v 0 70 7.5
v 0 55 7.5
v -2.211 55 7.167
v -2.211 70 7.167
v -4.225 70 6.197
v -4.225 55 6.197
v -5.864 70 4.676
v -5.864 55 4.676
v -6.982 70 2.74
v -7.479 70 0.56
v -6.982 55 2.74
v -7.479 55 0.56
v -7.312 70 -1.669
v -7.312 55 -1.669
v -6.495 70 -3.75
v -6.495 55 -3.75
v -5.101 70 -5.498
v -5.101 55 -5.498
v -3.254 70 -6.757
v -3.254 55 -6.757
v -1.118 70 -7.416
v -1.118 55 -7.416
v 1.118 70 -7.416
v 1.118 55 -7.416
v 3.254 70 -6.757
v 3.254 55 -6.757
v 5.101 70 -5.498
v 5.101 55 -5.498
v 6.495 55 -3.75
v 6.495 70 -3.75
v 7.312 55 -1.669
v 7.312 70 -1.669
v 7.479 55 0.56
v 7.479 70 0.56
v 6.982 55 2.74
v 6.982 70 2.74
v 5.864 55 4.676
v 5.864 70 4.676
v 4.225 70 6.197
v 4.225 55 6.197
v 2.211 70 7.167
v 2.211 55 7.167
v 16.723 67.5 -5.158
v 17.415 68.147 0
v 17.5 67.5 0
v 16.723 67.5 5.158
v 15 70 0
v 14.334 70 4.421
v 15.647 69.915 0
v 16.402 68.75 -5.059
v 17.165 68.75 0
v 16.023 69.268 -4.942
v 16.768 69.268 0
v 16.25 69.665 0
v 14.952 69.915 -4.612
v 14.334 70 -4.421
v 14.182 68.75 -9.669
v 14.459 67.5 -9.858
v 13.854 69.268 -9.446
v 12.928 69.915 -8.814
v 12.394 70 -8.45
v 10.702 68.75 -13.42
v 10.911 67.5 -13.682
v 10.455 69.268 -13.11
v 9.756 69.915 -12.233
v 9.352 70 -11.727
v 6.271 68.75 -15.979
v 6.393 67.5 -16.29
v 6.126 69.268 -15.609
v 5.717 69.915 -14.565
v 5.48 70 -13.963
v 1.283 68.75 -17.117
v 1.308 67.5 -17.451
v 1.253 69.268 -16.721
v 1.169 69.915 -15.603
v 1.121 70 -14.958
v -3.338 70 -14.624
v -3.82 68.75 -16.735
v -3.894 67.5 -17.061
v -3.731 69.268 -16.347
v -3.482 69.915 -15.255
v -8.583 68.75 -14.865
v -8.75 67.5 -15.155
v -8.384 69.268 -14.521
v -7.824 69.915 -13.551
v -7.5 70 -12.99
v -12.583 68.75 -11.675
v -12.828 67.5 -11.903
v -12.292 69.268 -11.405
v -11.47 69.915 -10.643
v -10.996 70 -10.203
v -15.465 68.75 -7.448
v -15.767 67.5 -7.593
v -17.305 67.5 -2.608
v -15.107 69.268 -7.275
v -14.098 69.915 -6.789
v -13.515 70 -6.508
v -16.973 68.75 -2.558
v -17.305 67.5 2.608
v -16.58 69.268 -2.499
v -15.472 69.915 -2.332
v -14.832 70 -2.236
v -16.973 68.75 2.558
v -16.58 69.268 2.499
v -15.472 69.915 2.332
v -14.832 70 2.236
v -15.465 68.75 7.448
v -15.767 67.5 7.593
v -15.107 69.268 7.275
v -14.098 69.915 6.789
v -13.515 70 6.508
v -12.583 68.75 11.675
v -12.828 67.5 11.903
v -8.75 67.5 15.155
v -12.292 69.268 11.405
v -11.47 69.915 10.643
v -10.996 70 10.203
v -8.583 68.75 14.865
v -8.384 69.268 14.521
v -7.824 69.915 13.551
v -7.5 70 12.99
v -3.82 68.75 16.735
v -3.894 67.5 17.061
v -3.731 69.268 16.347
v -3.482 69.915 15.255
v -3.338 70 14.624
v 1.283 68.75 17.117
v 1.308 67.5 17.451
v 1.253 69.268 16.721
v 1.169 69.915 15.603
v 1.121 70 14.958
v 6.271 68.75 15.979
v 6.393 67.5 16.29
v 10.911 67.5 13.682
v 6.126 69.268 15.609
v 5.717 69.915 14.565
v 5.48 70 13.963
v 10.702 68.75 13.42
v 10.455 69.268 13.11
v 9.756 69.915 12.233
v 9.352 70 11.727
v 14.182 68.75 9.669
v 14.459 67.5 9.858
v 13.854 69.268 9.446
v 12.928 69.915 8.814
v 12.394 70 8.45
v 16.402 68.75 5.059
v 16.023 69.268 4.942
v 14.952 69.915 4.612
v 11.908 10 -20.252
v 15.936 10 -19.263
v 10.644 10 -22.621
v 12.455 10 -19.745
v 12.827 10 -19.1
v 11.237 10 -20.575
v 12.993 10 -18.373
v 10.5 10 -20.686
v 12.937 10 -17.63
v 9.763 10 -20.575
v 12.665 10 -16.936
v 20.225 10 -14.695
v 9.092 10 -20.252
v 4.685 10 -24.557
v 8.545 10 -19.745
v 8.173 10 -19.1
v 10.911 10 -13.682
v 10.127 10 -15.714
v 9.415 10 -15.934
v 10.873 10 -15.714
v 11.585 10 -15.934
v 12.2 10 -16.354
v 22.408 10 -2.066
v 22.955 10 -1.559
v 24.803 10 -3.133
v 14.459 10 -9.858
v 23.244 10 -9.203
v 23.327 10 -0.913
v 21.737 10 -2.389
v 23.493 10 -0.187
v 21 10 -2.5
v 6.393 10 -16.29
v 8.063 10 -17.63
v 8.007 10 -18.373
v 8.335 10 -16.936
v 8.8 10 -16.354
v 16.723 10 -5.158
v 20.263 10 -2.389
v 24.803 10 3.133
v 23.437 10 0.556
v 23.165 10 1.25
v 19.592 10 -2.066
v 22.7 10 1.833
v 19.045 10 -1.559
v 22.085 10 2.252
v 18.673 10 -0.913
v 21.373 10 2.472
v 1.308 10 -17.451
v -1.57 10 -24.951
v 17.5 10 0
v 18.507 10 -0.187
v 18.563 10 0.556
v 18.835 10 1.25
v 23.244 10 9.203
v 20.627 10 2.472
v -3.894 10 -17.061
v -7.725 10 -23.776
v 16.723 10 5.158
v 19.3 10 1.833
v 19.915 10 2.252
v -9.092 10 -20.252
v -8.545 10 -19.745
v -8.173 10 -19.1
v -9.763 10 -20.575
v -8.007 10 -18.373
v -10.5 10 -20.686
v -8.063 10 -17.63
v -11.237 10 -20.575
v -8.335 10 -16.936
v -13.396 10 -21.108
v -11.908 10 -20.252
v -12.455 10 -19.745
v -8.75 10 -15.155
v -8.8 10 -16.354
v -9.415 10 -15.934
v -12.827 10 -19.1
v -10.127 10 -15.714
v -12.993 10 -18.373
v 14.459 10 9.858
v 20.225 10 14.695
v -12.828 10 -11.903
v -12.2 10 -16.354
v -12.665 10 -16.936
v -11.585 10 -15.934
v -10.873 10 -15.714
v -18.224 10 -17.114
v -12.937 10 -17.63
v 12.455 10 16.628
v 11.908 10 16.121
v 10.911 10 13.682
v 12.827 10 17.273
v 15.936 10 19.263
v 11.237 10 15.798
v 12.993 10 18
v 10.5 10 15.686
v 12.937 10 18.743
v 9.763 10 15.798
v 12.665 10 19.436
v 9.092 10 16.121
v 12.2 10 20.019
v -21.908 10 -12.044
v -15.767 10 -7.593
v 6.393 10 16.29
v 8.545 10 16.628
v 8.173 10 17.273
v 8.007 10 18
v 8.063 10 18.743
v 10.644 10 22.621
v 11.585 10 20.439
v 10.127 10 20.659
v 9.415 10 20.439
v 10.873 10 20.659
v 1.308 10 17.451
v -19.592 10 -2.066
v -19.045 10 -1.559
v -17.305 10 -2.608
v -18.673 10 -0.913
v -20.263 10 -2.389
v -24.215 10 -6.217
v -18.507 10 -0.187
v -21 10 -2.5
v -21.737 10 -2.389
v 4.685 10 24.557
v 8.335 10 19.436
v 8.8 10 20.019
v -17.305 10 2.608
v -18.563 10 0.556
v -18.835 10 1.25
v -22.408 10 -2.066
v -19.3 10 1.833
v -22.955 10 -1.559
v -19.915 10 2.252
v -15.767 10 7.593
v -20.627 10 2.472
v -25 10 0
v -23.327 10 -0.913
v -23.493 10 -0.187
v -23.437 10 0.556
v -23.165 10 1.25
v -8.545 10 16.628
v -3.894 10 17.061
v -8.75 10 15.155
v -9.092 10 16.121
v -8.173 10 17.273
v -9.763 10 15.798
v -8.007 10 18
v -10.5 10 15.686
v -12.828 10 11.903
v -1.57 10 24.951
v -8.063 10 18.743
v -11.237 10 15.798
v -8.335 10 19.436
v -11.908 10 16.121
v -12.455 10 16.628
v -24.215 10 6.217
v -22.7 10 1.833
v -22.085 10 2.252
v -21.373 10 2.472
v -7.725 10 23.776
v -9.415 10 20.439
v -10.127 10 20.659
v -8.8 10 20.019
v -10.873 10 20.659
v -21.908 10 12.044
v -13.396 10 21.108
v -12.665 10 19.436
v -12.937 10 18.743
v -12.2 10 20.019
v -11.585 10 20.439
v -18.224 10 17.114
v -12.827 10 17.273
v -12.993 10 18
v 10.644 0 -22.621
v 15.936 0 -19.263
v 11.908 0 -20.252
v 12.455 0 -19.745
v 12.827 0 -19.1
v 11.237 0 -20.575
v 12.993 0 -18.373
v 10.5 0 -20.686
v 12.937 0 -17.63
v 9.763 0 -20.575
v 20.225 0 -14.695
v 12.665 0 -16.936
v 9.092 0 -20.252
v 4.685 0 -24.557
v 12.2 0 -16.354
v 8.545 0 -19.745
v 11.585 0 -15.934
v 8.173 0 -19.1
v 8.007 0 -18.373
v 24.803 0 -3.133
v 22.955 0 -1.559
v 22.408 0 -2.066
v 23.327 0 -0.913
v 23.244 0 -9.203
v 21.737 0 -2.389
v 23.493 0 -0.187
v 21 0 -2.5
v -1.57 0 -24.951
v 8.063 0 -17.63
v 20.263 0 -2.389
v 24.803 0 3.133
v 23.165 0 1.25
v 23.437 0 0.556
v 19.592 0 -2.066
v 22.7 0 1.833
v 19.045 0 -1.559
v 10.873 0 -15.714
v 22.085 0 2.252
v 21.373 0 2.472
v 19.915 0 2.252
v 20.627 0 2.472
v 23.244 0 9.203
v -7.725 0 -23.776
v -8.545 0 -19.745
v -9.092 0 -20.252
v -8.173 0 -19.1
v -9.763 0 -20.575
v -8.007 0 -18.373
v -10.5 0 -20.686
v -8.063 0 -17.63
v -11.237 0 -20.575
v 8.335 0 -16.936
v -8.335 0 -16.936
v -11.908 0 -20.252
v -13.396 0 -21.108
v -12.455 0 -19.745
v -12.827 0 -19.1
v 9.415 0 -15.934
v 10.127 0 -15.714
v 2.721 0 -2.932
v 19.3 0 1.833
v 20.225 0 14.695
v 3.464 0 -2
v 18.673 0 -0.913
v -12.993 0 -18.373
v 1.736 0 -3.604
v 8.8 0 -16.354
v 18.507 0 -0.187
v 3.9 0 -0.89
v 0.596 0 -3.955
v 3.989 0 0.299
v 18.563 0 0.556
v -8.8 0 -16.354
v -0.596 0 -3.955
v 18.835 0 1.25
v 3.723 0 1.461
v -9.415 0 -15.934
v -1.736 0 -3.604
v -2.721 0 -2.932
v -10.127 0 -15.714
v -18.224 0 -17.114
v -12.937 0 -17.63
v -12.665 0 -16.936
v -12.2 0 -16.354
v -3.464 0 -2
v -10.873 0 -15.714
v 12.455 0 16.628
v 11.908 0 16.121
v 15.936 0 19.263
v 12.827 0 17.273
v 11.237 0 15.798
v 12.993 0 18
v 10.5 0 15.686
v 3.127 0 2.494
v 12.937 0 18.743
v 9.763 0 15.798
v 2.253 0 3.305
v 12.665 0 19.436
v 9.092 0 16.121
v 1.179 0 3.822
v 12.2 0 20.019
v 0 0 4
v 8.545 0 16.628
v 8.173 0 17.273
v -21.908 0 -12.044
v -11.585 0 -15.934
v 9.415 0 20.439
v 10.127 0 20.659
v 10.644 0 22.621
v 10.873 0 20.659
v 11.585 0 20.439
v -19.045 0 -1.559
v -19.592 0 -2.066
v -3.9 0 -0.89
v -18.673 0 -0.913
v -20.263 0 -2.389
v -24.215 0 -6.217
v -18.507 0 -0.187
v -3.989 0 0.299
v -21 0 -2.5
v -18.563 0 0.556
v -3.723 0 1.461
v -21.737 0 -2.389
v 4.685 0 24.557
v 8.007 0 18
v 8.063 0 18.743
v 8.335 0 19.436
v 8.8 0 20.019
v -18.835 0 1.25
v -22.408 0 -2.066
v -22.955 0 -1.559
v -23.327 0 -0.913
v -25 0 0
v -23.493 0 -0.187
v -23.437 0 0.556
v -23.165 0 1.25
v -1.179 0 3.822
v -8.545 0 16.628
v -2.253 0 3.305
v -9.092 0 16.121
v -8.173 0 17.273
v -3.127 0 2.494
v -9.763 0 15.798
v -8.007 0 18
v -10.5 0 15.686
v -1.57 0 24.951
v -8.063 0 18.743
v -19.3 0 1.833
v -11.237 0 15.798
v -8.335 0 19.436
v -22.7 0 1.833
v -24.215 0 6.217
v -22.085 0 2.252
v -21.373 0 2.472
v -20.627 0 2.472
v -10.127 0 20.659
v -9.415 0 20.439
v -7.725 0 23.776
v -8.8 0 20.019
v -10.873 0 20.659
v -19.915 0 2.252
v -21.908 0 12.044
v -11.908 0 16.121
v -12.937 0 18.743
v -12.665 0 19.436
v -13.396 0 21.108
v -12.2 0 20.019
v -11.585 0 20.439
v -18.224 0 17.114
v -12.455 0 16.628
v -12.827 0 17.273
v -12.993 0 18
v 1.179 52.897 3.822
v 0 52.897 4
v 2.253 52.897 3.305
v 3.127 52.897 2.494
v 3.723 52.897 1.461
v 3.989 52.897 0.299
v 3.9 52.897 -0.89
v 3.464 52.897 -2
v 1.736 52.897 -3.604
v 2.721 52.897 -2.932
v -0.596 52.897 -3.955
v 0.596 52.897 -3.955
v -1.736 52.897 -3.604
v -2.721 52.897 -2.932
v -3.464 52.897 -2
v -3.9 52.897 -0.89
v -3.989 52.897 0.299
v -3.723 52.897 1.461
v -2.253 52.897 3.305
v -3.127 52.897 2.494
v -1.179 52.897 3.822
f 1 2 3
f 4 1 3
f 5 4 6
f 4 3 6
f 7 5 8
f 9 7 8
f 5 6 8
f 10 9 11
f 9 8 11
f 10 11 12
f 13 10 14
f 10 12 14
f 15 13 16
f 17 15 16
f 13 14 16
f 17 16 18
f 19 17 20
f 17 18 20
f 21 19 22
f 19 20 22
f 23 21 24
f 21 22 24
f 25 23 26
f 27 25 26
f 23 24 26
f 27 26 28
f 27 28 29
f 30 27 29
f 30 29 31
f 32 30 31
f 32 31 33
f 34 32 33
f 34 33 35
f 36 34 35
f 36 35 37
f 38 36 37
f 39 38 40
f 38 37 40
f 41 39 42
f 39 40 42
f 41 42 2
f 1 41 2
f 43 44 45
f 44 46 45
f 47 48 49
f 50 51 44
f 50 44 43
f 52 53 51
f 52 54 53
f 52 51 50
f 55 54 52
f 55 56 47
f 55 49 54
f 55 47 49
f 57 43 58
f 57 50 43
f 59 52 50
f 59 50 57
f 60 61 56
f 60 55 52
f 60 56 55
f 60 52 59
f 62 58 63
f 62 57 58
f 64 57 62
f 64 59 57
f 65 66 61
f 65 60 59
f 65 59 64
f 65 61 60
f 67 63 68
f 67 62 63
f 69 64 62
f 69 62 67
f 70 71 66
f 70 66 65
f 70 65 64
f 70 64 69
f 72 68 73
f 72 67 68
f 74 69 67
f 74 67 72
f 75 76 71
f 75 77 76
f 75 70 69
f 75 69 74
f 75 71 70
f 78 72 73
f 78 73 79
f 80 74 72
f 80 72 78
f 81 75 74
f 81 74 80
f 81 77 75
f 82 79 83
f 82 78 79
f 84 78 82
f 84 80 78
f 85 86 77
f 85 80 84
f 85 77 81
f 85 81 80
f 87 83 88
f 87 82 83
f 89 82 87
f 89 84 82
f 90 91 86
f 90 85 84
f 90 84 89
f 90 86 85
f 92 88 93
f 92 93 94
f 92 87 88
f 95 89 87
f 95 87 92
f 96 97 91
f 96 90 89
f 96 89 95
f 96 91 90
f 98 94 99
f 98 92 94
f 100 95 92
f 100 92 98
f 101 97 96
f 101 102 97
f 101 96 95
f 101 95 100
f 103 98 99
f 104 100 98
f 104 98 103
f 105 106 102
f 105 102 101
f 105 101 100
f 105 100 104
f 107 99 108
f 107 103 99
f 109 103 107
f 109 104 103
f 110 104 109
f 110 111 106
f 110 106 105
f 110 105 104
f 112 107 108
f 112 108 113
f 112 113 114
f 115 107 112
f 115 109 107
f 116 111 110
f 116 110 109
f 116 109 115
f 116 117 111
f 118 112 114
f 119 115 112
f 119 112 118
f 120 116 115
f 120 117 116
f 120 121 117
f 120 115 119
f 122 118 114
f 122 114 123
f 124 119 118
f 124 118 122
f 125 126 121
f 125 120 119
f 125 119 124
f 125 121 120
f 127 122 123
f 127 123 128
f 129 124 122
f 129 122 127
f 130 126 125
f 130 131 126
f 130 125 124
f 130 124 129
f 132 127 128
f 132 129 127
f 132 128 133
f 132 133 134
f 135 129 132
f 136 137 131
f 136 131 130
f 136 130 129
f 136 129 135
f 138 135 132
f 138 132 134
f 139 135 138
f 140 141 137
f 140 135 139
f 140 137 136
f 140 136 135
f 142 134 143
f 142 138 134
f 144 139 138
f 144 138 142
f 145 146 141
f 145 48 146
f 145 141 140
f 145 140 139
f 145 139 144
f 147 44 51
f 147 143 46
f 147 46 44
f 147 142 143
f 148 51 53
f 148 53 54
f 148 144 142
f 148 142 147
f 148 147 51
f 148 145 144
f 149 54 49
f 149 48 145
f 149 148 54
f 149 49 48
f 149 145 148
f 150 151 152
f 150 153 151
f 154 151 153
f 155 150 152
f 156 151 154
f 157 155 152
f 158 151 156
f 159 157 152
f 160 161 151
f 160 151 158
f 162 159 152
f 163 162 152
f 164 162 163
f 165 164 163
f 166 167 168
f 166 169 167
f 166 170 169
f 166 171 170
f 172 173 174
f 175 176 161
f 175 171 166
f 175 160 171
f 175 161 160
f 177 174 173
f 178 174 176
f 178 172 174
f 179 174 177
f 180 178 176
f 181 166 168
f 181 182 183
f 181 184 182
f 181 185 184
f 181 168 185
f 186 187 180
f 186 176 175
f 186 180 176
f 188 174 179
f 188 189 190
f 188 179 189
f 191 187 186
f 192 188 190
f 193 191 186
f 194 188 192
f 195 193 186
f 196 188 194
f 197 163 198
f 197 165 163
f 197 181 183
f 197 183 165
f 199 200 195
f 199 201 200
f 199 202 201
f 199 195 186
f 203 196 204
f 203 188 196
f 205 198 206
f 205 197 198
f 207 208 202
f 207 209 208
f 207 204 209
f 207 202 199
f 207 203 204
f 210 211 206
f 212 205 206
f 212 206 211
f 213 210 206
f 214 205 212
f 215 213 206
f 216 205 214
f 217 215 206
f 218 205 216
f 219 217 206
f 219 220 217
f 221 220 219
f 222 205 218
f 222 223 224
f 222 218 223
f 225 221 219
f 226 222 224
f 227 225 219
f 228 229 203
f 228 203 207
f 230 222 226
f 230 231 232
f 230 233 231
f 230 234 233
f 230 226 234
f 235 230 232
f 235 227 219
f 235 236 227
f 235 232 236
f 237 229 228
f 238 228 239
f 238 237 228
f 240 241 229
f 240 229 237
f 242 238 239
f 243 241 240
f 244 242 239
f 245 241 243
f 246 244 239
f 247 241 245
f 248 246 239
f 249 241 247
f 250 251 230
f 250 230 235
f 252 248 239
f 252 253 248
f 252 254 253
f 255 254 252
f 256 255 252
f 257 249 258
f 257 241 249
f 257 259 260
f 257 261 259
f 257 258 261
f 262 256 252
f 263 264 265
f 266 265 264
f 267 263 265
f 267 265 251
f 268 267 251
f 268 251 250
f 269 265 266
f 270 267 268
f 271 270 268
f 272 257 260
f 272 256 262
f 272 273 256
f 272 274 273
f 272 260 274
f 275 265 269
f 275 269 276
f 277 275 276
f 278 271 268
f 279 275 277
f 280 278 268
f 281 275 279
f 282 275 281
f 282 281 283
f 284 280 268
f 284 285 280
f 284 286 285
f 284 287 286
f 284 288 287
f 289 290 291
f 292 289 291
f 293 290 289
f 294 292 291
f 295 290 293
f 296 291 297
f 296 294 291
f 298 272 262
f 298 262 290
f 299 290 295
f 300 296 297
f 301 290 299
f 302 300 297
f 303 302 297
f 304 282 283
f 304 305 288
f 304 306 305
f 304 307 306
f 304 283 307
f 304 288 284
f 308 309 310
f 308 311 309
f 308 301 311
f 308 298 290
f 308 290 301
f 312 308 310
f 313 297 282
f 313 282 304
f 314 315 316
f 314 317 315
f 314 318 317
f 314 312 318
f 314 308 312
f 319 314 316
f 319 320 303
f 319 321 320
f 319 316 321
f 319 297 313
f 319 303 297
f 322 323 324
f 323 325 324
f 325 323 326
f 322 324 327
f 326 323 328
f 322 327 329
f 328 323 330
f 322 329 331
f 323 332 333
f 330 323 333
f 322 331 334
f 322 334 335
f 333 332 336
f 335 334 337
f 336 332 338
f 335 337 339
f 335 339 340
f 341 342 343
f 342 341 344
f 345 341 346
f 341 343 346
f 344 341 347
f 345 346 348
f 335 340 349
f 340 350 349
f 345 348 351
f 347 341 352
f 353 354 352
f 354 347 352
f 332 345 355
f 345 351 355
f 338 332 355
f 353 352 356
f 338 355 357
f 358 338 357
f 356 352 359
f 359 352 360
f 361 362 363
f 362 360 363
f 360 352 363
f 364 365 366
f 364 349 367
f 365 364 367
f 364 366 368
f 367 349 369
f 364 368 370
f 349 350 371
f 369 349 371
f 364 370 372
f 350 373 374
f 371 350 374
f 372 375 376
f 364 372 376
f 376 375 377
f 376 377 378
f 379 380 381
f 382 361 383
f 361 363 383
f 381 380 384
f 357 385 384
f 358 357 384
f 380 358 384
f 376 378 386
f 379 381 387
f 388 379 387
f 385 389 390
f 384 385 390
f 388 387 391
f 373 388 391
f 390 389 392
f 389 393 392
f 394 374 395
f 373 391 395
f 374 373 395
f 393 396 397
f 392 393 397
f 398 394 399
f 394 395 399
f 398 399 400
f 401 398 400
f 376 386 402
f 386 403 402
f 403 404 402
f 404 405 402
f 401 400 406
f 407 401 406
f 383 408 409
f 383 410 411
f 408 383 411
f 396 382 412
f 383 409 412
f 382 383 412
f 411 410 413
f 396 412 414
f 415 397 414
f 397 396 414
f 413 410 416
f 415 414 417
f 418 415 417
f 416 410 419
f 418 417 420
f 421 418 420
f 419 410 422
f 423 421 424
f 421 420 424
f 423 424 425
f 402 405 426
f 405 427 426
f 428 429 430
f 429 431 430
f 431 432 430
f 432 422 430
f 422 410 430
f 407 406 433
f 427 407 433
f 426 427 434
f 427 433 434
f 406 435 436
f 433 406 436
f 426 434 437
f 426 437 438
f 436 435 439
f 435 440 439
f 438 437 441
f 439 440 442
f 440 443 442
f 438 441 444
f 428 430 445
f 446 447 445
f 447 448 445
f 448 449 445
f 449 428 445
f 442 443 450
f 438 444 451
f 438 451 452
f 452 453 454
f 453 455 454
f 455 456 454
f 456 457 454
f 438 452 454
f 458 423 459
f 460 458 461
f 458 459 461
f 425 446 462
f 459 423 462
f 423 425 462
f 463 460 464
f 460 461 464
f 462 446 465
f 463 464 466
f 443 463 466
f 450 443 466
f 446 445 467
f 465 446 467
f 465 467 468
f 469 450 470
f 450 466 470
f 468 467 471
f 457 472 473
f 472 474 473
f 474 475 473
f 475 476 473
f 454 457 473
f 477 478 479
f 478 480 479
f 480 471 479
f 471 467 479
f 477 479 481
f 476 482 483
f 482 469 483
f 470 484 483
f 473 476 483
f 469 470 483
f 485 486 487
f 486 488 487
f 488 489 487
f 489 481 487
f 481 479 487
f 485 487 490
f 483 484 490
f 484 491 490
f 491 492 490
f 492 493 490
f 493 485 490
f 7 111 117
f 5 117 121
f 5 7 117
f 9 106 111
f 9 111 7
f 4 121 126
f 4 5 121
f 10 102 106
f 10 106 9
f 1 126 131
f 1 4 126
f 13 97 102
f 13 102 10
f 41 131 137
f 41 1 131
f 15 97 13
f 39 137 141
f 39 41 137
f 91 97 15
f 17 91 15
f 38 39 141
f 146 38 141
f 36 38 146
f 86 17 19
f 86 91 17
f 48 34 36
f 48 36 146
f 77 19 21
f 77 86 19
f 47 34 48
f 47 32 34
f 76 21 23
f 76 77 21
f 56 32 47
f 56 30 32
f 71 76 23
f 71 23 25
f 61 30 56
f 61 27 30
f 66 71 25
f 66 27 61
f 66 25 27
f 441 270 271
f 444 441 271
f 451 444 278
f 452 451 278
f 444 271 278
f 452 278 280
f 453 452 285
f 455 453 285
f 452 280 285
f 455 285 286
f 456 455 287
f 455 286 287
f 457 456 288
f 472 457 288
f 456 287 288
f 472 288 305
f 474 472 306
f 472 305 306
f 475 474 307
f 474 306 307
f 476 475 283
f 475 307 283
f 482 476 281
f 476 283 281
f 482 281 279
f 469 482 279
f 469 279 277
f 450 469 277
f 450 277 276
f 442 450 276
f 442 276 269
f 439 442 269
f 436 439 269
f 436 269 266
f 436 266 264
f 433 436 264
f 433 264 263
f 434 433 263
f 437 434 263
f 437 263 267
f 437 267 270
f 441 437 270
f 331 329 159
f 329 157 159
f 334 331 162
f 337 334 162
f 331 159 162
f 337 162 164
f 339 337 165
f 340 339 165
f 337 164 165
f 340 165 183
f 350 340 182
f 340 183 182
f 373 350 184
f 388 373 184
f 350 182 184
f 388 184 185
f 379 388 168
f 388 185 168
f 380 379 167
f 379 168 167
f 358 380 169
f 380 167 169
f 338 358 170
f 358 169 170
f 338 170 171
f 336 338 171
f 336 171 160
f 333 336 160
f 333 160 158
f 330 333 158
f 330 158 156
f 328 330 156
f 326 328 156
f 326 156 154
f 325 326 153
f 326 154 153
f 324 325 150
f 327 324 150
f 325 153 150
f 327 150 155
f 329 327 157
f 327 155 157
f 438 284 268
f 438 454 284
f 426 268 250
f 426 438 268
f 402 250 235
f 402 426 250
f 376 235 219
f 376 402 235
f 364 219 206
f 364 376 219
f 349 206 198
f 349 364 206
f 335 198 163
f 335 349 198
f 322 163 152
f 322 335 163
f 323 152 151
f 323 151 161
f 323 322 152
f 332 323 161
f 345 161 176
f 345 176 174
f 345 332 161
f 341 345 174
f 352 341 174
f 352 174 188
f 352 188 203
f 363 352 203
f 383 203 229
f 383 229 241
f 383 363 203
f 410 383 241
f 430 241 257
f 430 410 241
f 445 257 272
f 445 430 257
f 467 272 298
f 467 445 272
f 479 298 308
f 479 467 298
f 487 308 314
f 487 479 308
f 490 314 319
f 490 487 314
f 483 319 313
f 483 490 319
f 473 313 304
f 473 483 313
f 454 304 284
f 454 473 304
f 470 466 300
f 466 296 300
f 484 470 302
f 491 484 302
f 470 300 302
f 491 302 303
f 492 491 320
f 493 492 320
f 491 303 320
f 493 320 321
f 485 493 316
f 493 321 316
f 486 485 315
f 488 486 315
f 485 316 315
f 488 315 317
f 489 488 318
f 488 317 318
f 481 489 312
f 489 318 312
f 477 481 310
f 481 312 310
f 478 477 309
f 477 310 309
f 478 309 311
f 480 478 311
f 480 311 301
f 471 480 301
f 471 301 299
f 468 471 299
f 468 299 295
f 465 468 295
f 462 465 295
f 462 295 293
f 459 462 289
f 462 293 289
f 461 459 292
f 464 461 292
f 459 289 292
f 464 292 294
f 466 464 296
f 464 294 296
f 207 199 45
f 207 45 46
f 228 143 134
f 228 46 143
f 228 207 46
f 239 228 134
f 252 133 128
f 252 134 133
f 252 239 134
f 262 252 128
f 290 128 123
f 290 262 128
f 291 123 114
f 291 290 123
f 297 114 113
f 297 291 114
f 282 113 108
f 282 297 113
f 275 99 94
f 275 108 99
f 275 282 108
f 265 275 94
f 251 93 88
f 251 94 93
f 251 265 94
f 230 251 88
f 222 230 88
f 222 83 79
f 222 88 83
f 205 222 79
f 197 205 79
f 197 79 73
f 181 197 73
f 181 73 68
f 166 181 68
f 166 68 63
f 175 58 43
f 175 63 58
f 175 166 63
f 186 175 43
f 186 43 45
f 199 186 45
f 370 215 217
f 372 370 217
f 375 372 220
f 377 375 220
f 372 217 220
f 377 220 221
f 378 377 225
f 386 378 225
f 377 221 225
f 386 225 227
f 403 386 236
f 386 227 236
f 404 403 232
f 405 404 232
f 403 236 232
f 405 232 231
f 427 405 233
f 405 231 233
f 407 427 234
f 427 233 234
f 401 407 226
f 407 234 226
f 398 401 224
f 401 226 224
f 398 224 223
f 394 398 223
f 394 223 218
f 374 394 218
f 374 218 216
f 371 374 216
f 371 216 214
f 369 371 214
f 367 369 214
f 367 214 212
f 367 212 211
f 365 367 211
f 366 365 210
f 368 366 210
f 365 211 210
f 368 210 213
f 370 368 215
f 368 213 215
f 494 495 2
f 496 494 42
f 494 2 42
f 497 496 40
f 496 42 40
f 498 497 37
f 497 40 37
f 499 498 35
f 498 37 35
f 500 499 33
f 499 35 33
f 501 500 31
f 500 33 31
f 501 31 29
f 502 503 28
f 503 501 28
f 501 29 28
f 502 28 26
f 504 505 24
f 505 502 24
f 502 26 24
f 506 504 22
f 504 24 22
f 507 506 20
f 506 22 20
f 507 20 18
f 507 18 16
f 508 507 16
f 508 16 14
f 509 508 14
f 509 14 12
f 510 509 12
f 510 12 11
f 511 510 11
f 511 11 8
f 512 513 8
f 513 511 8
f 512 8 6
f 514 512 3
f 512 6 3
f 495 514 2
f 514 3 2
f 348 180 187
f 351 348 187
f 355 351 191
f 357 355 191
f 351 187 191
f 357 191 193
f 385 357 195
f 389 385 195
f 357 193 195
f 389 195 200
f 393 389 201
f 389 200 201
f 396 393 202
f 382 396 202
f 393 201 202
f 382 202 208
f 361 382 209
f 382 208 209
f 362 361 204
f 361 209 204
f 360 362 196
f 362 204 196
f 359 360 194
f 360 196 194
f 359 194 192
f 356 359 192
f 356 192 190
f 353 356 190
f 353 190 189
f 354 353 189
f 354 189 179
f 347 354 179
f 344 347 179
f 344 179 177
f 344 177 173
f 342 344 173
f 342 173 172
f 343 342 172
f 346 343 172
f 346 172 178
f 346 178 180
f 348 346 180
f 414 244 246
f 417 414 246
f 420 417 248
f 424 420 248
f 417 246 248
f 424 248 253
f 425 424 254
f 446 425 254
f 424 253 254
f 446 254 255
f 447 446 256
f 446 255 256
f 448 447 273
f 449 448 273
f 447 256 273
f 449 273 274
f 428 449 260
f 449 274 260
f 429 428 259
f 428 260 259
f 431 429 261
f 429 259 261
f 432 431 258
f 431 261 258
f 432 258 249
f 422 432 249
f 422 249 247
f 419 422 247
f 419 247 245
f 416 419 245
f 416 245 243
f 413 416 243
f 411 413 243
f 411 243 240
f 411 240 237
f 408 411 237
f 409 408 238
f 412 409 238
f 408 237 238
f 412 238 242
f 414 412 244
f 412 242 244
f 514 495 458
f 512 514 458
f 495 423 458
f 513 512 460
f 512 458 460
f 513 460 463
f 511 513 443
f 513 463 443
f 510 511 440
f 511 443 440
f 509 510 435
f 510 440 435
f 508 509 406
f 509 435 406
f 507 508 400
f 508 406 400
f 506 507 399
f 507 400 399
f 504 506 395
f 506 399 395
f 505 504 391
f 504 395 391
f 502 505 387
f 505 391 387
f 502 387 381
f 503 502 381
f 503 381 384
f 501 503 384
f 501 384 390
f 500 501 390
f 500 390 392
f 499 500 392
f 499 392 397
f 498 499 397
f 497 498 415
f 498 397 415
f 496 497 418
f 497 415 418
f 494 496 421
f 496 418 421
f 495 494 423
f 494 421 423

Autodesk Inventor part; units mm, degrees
ref_plane "YZ Plane" through (0, 0, 0) normal (1, 0, 0) x (0, 1, 0)
sketch "Sketch1" plane through (0, 0, 0) normal (0, 1, 0) x (-1, 0, 0)
  circle A0 centre (0, 0) radius 25
  circle A1 centre (0, -30) radius 5
  circle A2 centre (30, 0) radius 5
  circle A3 centre (0, 30) radius 5
  circle A4 centre (-30, 0) radius 5
  dimension "d0" = 50
  dimension "d1" = 10
  dimension "d2" = 30
  dimension "d5" = 360
extrude "Extrusion1" add sketch "Sketch1" along normal blind 10 contours A0
thread "Thread1" size "M10x1.5" class "6H" standard "ANSI Metric M Profile" length 20
thread "Thread2" size "M10x1.5" class "6H" standard "ANSI Metric M Profile" length 20
thread "Thread3" size "M10x1.5" class "6H" standard "ANSI Metric M Profile" length 20
thread "Thread4" size "M10x1.5" class "6H" standard "ANSI Metric M Profile" length 20
sketch "Sketch2" plane through (0, 10, 0) normal (0, 1, 0) x (1, 0, 0)
  circle A0 centre (0, 0) radius 17.5
  dimension "d17" = 35
extrude "Extrusion2" add sketch "Sketch2" along normal blind 60
sketch "Sketch3" plane through (0, 70, 0) normal (0, 1, 0) x (1, 0, 0)
  circle A0 centre (0, 0) radius 10
  dimension "d20" = 20
hole "Hole1" at (0, 70, 0) direction (0, -1, 0) diameter 8 end through all
ref_plane "Work Plane1" through (0, 68, 0) normal (0, 1, 0) x (-1, 0, 0)
ref_plane "Work Plane2" through (0, 65, 0) normal (0, -1, 0) x (1, 0, 0)
sketch "Sketch6" plane through (0, 65, 0) normal (0, -1, 0) x (1, 0, 0)
  point P0 (0, 0)
fillet "Fillet2" radius 2.5 1 edges at (-17.5, 70, 0)
thread "Thread10" size "M15x1.5" class "6H" standard "ANSI Metric M Profile" length 16.401
sketch "Sketch9" plane through (0, 70, 0) normal (0, 1, 0) x (1, 0, 0)
  circle A0 centre (0, 0) radius 4 projected
  circle A1 centre (0, 0) radius 7.5
  dimension "d61" = 15
hole "Hole3" at (0, 70, 0) direction (0, -1, 0) diameter 15 depth 15 tip angle 118
thread "Thread11" size "M15x1.5" class "6H" standard "ANSI Metric M Profile" full length
sketch "Sketch10" plane through (0, 0, 0) normal (0, -1, 0) x (1, 0, 0)
  circle A0 centre (-21, 0) radius 2.75
  circle A1 centre (-10.5, -18.1865) radius 2.75
  circle A2 centre (10.5, -18.1865) radius 2.75
  circle A3 centre (21, 0) radius 2.75
  circle A4 centre (10.5, 18.1865) radius 2.75
  circle A5 centre (-10.5, 18.1865) radius 2.75
  point P0 (0, 0)
  dimension "d71" = 5.5
  dimension "d72" = 21
  dimension "d75" = 360
hole "Hole4" at (-21, 0, 0) at (-10.5, 0, 18.1865) at (10.5, 0, 18.1865) at (21, 0, 0) at (10.5, 0, -18.1865) at (-10.5, 0, -18.1865) direction (0, 1, 0) diameter 5 depth 10 tip angle 118
thread "Thread12" size "M5x0.8" class "6H" standard "ANSI Metric M Profile" full length
thread "Thread13" size "M5x0.8" class "6H" standard "ANSI Metric M Profile" full length
thread "Thread14" size "M5x0.8" class "6H" standard "ANSI Metric M Profile" full length
thread "Thread15" size "M5x0.8" class "6H" standard "ANSI Metric M Profile" full length
thread "Thread16" size "M5x0.8" class "6H" standard "ANSI Metric M Profile" full length
thread "Thread17" size "M5x0.8" class "6H" standard "ANSI Metric M Profile" full length
properties part number "pintle body" material "Aluminum 6061"
